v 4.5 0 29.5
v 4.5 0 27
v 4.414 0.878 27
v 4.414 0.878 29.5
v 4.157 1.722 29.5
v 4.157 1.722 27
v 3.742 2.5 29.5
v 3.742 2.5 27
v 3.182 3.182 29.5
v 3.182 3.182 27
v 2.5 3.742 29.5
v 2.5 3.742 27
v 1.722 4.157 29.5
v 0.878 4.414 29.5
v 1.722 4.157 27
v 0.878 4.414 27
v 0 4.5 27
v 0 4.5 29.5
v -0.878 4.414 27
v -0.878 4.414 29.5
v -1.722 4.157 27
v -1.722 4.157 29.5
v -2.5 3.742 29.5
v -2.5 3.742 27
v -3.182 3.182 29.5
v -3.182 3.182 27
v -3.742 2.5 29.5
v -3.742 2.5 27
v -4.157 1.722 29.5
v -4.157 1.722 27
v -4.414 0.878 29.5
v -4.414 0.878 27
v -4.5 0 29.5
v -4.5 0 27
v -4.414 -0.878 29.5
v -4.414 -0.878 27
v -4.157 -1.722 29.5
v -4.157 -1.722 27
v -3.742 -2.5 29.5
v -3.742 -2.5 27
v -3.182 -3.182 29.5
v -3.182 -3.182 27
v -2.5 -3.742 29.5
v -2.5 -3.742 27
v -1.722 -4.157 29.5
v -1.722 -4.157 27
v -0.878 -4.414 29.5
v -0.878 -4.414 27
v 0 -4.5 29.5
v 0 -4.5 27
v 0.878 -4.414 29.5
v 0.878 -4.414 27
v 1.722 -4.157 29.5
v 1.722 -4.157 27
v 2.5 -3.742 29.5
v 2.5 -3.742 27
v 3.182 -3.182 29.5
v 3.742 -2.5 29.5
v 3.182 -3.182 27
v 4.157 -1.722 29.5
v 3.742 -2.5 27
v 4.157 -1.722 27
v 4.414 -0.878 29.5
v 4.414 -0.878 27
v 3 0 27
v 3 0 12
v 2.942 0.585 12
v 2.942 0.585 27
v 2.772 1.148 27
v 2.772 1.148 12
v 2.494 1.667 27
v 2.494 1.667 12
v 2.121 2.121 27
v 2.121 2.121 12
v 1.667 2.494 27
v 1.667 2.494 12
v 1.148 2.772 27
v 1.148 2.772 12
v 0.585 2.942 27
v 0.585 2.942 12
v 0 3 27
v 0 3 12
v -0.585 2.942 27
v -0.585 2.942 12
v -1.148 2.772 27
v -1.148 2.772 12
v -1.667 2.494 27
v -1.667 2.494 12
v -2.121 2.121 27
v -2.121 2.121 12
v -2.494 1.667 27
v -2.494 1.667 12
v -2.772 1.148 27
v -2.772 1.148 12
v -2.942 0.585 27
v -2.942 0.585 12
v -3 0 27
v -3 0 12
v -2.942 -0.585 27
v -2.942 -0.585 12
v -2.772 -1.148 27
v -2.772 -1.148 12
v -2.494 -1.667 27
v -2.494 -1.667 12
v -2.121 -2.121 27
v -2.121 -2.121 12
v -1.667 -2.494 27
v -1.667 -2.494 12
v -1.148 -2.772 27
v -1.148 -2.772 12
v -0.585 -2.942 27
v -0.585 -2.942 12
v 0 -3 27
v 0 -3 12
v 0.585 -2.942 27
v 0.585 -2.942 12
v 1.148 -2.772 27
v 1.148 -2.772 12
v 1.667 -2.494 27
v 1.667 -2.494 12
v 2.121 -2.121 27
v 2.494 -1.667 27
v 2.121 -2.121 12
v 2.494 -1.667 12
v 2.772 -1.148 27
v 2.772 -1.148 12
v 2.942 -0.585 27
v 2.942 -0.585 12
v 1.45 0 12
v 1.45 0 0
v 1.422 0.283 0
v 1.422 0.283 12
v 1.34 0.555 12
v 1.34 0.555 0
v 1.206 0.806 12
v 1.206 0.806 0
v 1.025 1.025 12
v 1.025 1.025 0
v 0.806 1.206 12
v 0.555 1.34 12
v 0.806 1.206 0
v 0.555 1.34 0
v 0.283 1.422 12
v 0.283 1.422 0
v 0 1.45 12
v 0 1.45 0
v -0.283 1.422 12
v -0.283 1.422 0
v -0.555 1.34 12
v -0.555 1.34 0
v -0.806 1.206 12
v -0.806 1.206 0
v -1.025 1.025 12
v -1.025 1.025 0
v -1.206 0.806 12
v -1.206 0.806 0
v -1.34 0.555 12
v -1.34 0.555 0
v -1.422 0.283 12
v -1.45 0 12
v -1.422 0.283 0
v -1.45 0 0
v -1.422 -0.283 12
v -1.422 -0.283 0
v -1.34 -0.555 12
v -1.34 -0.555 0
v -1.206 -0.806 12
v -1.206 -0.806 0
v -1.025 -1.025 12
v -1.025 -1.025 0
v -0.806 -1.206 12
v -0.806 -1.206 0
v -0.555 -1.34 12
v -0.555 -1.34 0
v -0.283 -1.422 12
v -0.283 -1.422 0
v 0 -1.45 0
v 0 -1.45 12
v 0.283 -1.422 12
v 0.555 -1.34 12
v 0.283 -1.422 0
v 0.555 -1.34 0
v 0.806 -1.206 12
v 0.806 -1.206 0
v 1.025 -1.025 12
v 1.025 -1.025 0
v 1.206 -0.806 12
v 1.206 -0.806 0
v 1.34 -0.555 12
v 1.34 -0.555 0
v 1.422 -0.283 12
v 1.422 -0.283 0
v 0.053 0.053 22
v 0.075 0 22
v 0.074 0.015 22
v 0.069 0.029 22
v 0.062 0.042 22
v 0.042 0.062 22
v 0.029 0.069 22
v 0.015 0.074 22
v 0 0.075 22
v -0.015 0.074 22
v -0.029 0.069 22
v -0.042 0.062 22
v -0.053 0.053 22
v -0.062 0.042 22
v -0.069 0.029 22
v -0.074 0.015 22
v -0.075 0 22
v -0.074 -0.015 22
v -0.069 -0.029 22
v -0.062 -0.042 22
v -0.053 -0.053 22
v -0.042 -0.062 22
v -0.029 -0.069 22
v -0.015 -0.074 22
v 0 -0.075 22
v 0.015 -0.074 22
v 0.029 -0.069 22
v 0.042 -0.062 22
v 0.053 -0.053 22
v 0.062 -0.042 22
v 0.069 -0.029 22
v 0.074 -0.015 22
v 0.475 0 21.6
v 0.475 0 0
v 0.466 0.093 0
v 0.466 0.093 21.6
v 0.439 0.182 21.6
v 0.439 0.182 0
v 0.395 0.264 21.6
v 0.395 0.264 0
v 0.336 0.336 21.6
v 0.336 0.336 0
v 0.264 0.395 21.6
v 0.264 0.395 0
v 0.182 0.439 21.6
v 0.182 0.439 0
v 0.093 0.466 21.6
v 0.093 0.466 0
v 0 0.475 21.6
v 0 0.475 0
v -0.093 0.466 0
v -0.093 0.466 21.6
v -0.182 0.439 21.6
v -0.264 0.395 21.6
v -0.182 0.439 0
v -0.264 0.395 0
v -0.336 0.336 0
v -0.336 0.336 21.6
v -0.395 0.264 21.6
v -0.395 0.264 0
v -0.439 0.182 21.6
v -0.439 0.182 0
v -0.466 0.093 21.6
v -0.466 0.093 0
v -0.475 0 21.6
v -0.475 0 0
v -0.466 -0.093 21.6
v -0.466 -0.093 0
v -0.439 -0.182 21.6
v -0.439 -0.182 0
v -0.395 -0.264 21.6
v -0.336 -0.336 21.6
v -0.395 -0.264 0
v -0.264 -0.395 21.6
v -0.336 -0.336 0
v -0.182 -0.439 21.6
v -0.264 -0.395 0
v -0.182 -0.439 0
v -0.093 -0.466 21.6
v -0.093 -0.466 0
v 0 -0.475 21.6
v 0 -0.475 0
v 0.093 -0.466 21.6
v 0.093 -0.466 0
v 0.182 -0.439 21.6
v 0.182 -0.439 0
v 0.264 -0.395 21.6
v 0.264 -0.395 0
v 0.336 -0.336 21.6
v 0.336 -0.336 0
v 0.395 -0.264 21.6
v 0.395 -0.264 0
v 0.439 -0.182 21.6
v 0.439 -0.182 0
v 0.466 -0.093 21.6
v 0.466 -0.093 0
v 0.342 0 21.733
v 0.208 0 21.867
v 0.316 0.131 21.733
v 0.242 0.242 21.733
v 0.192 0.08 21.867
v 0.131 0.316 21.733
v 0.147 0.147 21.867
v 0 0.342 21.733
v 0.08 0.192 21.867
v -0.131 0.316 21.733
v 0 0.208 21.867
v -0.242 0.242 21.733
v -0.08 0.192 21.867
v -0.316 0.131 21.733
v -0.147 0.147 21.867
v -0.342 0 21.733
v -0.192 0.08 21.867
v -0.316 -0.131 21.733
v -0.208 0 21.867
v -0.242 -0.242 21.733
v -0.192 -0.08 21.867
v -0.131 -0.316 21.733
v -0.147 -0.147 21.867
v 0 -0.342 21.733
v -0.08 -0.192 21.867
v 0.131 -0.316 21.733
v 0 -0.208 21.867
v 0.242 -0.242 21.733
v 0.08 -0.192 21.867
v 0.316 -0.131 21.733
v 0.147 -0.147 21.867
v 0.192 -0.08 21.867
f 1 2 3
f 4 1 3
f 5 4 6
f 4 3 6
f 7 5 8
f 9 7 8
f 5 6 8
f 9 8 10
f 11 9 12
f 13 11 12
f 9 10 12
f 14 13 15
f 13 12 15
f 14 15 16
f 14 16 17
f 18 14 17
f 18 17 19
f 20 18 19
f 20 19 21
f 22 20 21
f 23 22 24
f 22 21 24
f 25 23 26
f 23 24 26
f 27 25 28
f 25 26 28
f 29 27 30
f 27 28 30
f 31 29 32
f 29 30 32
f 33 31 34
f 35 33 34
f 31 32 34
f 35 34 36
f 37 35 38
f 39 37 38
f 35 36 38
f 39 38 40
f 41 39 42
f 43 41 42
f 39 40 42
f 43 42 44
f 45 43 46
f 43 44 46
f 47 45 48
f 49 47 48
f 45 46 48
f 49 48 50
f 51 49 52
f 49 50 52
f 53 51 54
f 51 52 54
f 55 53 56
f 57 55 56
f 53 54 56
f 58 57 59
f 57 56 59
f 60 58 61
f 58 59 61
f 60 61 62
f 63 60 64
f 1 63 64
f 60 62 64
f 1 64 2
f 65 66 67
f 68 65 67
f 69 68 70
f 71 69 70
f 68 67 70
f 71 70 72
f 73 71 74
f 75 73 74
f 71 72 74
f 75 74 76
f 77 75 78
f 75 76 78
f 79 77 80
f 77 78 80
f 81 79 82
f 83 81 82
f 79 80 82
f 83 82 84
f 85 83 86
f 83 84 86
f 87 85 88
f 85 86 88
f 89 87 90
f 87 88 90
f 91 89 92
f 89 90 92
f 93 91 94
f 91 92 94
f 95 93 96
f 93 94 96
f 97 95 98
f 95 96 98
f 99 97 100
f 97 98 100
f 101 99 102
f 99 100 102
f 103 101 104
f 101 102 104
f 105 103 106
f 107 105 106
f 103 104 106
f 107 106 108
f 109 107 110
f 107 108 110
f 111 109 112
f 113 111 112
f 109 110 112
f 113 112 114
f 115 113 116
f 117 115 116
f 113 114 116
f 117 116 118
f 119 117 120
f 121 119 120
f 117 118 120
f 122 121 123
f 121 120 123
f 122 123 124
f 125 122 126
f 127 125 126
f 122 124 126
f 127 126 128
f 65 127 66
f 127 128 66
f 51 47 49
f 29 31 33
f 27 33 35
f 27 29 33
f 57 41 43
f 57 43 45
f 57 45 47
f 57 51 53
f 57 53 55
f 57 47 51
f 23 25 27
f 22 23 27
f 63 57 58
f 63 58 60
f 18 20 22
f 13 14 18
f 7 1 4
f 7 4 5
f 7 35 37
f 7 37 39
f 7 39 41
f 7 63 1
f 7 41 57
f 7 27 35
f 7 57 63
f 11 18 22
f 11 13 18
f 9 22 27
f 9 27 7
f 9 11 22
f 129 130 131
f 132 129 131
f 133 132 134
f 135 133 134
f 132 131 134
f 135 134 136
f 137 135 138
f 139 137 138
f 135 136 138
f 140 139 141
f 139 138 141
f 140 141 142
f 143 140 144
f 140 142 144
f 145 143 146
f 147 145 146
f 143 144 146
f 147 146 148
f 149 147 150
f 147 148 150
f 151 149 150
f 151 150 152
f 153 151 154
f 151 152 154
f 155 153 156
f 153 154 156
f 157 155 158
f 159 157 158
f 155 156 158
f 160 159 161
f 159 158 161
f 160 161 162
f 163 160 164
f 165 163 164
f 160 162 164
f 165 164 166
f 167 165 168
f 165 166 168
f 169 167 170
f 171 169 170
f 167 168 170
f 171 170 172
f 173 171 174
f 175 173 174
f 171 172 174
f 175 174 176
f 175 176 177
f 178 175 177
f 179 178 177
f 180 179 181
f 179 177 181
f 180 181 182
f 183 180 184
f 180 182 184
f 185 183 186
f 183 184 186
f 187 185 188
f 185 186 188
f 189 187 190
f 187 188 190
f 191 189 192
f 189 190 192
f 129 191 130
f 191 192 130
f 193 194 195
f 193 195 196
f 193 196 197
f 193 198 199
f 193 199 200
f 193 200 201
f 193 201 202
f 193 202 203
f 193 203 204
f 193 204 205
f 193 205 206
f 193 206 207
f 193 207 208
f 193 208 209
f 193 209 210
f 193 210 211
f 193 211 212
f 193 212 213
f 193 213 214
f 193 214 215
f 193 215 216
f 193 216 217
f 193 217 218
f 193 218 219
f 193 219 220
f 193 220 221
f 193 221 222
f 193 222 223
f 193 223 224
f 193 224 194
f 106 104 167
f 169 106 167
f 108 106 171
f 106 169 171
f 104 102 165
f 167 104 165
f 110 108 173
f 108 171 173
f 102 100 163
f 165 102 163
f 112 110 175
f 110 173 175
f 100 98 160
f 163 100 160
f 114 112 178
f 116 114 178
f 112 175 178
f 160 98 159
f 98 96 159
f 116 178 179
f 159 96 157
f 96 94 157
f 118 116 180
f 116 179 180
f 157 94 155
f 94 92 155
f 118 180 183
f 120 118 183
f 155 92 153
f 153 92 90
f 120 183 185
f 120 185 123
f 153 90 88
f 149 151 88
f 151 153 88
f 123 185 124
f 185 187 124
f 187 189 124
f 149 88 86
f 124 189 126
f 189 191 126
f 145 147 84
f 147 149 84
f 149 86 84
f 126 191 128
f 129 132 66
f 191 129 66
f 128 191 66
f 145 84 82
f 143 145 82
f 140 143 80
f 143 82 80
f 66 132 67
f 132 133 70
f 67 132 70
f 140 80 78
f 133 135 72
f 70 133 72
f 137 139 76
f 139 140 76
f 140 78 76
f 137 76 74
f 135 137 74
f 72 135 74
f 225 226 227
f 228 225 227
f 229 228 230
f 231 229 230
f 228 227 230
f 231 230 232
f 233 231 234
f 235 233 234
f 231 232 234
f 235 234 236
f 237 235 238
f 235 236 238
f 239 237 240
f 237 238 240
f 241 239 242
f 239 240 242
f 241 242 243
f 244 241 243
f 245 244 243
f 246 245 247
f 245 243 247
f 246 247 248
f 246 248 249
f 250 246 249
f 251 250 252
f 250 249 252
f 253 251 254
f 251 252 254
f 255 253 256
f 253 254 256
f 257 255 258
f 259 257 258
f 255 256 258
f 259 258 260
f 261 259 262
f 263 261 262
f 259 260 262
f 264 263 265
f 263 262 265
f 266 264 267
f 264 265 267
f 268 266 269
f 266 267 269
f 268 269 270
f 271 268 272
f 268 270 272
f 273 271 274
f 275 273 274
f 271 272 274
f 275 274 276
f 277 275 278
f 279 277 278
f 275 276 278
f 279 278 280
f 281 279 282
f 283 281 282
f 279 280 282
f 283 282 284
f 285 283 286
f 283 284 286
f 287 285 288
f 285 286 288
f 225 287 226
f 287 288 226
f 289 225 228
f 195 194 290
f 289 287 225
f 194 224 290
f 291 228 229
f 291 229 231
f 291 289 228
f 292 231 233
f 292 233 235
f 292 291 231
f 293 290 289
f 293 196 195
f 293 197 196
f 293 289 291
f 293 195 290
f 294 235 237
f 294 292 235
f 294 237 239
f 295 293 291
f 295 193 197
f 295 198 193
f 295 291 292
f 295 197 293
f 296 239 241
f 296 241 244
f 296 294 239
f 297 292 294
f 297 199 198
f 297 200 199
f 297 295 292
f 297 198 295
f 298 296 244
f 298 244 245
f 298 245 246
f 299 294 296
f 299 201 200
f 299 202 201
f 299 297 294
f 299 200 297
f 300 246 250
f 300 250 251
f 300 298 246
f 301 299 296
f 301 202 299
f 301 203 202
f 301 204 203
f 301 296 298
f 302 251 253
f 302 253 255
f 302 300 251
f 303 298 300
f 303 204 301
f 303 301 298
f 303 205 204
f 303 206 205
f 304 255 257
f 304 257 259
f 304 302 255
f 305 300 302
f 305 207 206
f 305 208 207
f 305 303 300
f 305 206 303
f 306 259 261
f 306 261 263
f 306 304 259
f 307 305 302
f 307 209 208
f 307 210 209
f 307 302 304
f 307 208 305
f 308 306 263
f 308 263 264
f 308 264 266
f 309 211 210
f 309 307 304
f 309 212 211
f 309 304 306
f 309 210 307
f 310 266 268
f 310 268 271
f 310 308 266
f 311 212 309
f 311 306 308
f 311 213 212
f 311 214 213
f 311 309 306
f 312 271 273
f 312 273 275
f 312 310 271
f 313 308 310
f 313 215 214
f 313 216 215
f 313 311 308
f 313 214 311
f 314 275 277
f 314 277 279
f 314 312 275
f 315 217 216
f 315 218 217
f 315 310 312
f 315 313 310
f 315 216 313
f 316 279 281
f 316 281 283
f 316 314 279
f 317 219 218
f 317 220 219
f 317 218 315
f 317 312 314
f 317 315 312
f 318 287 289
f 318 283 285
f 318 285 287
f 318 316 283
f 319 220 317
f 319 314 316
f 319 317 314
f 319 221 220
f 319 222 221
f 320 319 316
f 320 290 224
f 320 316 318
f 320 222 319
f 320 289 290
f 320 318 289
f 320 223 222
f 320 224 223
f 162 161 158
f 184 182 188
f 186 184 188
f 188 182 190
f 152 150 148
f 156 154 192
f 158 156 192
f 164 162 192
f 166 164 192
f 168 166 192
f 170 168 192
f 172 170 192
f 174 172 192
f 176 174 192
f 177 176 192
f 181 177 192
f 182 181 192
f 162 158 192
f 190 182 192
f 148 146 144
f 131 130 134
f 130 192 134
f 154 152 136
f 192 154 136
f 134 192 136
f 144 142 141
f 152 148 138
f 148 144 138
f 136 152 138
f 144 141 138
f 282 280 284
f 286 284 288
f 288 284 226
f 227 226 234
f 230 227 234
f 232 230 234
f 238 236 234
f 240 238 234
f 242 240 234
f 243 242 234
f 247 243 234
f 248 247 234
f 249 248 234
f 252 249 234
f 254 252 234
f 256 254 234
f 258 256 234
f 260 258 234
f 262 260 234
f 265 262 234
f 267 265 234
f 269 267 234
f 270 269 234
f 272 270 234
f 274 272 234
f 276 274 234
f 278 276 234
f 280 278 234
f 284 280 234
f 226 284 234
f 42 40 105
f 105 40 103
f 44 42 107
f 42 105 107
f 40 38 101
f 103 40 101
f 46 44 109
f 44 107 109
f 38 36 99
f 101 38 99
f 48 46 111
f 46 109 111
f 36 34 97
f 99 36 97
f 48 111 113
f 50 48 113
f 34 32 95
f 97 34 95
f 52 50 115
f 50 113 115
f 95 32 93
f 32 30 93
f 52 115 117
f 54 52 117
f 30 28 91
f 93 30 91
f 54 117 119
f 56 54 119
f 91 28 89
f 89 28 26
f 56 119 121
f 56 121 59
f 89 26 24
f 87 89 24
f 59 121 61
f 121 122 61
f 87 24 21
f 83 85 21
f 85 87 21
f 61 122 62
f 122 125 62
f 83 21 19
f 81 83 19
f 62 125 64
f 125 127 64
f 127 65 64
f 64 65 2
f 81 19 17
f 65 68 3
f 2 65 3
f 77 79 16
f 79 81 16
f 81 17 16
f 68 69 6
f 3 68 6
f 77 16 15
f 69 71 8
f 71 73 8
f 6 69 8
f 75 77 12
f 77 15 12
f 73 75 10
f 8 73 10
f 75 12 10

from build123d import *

# Parameters (mm, degrees)
F0_R     = 1.45
F1_DEPTH = 12
F2_R     = 3
F3_DEPTH = 15
F4_R     = 4.5
F5_DEPTH = 2.5
F6_R     = 0.475
F7_DEPTH = 22
F8_SIZE  = 0.4


with BuildPart() as f1:
    # F0 (on Top) → F1 (new body)
    with BuildSketch(Plane.XY):
        Circle(F0_R)
    extrude(amount=F1_DEPTH)

    # F2 (on face) → F3 (join)
    with BuildSketch(Plane.XY.offset(12)):
        Circle(F2_R)
    extrude(amount=F3_DEPTH)

    # F4 (on face) → F5 (join)
    with BuildSketch(Plane.XY.offset(27)):
        Circle(F4_R)
    extrude(amount=F5_DEPTH)


with BuildPart() as f7:
    # F6 (on Top) → F7 (new body)
    with BuildSketch(Plane.XY):
        Circle(F6_R)
    extrude(amount=F7_DEPTH)

    # F8
    f8_edges = [f7.edges().sort_by_distance(p)[0] for p in [
        (-0.475, 0, 22),
    ]]
    chamfer(f8_edges, length=F8_SIZE)


solid = Compound([f1.part, f7.part])
